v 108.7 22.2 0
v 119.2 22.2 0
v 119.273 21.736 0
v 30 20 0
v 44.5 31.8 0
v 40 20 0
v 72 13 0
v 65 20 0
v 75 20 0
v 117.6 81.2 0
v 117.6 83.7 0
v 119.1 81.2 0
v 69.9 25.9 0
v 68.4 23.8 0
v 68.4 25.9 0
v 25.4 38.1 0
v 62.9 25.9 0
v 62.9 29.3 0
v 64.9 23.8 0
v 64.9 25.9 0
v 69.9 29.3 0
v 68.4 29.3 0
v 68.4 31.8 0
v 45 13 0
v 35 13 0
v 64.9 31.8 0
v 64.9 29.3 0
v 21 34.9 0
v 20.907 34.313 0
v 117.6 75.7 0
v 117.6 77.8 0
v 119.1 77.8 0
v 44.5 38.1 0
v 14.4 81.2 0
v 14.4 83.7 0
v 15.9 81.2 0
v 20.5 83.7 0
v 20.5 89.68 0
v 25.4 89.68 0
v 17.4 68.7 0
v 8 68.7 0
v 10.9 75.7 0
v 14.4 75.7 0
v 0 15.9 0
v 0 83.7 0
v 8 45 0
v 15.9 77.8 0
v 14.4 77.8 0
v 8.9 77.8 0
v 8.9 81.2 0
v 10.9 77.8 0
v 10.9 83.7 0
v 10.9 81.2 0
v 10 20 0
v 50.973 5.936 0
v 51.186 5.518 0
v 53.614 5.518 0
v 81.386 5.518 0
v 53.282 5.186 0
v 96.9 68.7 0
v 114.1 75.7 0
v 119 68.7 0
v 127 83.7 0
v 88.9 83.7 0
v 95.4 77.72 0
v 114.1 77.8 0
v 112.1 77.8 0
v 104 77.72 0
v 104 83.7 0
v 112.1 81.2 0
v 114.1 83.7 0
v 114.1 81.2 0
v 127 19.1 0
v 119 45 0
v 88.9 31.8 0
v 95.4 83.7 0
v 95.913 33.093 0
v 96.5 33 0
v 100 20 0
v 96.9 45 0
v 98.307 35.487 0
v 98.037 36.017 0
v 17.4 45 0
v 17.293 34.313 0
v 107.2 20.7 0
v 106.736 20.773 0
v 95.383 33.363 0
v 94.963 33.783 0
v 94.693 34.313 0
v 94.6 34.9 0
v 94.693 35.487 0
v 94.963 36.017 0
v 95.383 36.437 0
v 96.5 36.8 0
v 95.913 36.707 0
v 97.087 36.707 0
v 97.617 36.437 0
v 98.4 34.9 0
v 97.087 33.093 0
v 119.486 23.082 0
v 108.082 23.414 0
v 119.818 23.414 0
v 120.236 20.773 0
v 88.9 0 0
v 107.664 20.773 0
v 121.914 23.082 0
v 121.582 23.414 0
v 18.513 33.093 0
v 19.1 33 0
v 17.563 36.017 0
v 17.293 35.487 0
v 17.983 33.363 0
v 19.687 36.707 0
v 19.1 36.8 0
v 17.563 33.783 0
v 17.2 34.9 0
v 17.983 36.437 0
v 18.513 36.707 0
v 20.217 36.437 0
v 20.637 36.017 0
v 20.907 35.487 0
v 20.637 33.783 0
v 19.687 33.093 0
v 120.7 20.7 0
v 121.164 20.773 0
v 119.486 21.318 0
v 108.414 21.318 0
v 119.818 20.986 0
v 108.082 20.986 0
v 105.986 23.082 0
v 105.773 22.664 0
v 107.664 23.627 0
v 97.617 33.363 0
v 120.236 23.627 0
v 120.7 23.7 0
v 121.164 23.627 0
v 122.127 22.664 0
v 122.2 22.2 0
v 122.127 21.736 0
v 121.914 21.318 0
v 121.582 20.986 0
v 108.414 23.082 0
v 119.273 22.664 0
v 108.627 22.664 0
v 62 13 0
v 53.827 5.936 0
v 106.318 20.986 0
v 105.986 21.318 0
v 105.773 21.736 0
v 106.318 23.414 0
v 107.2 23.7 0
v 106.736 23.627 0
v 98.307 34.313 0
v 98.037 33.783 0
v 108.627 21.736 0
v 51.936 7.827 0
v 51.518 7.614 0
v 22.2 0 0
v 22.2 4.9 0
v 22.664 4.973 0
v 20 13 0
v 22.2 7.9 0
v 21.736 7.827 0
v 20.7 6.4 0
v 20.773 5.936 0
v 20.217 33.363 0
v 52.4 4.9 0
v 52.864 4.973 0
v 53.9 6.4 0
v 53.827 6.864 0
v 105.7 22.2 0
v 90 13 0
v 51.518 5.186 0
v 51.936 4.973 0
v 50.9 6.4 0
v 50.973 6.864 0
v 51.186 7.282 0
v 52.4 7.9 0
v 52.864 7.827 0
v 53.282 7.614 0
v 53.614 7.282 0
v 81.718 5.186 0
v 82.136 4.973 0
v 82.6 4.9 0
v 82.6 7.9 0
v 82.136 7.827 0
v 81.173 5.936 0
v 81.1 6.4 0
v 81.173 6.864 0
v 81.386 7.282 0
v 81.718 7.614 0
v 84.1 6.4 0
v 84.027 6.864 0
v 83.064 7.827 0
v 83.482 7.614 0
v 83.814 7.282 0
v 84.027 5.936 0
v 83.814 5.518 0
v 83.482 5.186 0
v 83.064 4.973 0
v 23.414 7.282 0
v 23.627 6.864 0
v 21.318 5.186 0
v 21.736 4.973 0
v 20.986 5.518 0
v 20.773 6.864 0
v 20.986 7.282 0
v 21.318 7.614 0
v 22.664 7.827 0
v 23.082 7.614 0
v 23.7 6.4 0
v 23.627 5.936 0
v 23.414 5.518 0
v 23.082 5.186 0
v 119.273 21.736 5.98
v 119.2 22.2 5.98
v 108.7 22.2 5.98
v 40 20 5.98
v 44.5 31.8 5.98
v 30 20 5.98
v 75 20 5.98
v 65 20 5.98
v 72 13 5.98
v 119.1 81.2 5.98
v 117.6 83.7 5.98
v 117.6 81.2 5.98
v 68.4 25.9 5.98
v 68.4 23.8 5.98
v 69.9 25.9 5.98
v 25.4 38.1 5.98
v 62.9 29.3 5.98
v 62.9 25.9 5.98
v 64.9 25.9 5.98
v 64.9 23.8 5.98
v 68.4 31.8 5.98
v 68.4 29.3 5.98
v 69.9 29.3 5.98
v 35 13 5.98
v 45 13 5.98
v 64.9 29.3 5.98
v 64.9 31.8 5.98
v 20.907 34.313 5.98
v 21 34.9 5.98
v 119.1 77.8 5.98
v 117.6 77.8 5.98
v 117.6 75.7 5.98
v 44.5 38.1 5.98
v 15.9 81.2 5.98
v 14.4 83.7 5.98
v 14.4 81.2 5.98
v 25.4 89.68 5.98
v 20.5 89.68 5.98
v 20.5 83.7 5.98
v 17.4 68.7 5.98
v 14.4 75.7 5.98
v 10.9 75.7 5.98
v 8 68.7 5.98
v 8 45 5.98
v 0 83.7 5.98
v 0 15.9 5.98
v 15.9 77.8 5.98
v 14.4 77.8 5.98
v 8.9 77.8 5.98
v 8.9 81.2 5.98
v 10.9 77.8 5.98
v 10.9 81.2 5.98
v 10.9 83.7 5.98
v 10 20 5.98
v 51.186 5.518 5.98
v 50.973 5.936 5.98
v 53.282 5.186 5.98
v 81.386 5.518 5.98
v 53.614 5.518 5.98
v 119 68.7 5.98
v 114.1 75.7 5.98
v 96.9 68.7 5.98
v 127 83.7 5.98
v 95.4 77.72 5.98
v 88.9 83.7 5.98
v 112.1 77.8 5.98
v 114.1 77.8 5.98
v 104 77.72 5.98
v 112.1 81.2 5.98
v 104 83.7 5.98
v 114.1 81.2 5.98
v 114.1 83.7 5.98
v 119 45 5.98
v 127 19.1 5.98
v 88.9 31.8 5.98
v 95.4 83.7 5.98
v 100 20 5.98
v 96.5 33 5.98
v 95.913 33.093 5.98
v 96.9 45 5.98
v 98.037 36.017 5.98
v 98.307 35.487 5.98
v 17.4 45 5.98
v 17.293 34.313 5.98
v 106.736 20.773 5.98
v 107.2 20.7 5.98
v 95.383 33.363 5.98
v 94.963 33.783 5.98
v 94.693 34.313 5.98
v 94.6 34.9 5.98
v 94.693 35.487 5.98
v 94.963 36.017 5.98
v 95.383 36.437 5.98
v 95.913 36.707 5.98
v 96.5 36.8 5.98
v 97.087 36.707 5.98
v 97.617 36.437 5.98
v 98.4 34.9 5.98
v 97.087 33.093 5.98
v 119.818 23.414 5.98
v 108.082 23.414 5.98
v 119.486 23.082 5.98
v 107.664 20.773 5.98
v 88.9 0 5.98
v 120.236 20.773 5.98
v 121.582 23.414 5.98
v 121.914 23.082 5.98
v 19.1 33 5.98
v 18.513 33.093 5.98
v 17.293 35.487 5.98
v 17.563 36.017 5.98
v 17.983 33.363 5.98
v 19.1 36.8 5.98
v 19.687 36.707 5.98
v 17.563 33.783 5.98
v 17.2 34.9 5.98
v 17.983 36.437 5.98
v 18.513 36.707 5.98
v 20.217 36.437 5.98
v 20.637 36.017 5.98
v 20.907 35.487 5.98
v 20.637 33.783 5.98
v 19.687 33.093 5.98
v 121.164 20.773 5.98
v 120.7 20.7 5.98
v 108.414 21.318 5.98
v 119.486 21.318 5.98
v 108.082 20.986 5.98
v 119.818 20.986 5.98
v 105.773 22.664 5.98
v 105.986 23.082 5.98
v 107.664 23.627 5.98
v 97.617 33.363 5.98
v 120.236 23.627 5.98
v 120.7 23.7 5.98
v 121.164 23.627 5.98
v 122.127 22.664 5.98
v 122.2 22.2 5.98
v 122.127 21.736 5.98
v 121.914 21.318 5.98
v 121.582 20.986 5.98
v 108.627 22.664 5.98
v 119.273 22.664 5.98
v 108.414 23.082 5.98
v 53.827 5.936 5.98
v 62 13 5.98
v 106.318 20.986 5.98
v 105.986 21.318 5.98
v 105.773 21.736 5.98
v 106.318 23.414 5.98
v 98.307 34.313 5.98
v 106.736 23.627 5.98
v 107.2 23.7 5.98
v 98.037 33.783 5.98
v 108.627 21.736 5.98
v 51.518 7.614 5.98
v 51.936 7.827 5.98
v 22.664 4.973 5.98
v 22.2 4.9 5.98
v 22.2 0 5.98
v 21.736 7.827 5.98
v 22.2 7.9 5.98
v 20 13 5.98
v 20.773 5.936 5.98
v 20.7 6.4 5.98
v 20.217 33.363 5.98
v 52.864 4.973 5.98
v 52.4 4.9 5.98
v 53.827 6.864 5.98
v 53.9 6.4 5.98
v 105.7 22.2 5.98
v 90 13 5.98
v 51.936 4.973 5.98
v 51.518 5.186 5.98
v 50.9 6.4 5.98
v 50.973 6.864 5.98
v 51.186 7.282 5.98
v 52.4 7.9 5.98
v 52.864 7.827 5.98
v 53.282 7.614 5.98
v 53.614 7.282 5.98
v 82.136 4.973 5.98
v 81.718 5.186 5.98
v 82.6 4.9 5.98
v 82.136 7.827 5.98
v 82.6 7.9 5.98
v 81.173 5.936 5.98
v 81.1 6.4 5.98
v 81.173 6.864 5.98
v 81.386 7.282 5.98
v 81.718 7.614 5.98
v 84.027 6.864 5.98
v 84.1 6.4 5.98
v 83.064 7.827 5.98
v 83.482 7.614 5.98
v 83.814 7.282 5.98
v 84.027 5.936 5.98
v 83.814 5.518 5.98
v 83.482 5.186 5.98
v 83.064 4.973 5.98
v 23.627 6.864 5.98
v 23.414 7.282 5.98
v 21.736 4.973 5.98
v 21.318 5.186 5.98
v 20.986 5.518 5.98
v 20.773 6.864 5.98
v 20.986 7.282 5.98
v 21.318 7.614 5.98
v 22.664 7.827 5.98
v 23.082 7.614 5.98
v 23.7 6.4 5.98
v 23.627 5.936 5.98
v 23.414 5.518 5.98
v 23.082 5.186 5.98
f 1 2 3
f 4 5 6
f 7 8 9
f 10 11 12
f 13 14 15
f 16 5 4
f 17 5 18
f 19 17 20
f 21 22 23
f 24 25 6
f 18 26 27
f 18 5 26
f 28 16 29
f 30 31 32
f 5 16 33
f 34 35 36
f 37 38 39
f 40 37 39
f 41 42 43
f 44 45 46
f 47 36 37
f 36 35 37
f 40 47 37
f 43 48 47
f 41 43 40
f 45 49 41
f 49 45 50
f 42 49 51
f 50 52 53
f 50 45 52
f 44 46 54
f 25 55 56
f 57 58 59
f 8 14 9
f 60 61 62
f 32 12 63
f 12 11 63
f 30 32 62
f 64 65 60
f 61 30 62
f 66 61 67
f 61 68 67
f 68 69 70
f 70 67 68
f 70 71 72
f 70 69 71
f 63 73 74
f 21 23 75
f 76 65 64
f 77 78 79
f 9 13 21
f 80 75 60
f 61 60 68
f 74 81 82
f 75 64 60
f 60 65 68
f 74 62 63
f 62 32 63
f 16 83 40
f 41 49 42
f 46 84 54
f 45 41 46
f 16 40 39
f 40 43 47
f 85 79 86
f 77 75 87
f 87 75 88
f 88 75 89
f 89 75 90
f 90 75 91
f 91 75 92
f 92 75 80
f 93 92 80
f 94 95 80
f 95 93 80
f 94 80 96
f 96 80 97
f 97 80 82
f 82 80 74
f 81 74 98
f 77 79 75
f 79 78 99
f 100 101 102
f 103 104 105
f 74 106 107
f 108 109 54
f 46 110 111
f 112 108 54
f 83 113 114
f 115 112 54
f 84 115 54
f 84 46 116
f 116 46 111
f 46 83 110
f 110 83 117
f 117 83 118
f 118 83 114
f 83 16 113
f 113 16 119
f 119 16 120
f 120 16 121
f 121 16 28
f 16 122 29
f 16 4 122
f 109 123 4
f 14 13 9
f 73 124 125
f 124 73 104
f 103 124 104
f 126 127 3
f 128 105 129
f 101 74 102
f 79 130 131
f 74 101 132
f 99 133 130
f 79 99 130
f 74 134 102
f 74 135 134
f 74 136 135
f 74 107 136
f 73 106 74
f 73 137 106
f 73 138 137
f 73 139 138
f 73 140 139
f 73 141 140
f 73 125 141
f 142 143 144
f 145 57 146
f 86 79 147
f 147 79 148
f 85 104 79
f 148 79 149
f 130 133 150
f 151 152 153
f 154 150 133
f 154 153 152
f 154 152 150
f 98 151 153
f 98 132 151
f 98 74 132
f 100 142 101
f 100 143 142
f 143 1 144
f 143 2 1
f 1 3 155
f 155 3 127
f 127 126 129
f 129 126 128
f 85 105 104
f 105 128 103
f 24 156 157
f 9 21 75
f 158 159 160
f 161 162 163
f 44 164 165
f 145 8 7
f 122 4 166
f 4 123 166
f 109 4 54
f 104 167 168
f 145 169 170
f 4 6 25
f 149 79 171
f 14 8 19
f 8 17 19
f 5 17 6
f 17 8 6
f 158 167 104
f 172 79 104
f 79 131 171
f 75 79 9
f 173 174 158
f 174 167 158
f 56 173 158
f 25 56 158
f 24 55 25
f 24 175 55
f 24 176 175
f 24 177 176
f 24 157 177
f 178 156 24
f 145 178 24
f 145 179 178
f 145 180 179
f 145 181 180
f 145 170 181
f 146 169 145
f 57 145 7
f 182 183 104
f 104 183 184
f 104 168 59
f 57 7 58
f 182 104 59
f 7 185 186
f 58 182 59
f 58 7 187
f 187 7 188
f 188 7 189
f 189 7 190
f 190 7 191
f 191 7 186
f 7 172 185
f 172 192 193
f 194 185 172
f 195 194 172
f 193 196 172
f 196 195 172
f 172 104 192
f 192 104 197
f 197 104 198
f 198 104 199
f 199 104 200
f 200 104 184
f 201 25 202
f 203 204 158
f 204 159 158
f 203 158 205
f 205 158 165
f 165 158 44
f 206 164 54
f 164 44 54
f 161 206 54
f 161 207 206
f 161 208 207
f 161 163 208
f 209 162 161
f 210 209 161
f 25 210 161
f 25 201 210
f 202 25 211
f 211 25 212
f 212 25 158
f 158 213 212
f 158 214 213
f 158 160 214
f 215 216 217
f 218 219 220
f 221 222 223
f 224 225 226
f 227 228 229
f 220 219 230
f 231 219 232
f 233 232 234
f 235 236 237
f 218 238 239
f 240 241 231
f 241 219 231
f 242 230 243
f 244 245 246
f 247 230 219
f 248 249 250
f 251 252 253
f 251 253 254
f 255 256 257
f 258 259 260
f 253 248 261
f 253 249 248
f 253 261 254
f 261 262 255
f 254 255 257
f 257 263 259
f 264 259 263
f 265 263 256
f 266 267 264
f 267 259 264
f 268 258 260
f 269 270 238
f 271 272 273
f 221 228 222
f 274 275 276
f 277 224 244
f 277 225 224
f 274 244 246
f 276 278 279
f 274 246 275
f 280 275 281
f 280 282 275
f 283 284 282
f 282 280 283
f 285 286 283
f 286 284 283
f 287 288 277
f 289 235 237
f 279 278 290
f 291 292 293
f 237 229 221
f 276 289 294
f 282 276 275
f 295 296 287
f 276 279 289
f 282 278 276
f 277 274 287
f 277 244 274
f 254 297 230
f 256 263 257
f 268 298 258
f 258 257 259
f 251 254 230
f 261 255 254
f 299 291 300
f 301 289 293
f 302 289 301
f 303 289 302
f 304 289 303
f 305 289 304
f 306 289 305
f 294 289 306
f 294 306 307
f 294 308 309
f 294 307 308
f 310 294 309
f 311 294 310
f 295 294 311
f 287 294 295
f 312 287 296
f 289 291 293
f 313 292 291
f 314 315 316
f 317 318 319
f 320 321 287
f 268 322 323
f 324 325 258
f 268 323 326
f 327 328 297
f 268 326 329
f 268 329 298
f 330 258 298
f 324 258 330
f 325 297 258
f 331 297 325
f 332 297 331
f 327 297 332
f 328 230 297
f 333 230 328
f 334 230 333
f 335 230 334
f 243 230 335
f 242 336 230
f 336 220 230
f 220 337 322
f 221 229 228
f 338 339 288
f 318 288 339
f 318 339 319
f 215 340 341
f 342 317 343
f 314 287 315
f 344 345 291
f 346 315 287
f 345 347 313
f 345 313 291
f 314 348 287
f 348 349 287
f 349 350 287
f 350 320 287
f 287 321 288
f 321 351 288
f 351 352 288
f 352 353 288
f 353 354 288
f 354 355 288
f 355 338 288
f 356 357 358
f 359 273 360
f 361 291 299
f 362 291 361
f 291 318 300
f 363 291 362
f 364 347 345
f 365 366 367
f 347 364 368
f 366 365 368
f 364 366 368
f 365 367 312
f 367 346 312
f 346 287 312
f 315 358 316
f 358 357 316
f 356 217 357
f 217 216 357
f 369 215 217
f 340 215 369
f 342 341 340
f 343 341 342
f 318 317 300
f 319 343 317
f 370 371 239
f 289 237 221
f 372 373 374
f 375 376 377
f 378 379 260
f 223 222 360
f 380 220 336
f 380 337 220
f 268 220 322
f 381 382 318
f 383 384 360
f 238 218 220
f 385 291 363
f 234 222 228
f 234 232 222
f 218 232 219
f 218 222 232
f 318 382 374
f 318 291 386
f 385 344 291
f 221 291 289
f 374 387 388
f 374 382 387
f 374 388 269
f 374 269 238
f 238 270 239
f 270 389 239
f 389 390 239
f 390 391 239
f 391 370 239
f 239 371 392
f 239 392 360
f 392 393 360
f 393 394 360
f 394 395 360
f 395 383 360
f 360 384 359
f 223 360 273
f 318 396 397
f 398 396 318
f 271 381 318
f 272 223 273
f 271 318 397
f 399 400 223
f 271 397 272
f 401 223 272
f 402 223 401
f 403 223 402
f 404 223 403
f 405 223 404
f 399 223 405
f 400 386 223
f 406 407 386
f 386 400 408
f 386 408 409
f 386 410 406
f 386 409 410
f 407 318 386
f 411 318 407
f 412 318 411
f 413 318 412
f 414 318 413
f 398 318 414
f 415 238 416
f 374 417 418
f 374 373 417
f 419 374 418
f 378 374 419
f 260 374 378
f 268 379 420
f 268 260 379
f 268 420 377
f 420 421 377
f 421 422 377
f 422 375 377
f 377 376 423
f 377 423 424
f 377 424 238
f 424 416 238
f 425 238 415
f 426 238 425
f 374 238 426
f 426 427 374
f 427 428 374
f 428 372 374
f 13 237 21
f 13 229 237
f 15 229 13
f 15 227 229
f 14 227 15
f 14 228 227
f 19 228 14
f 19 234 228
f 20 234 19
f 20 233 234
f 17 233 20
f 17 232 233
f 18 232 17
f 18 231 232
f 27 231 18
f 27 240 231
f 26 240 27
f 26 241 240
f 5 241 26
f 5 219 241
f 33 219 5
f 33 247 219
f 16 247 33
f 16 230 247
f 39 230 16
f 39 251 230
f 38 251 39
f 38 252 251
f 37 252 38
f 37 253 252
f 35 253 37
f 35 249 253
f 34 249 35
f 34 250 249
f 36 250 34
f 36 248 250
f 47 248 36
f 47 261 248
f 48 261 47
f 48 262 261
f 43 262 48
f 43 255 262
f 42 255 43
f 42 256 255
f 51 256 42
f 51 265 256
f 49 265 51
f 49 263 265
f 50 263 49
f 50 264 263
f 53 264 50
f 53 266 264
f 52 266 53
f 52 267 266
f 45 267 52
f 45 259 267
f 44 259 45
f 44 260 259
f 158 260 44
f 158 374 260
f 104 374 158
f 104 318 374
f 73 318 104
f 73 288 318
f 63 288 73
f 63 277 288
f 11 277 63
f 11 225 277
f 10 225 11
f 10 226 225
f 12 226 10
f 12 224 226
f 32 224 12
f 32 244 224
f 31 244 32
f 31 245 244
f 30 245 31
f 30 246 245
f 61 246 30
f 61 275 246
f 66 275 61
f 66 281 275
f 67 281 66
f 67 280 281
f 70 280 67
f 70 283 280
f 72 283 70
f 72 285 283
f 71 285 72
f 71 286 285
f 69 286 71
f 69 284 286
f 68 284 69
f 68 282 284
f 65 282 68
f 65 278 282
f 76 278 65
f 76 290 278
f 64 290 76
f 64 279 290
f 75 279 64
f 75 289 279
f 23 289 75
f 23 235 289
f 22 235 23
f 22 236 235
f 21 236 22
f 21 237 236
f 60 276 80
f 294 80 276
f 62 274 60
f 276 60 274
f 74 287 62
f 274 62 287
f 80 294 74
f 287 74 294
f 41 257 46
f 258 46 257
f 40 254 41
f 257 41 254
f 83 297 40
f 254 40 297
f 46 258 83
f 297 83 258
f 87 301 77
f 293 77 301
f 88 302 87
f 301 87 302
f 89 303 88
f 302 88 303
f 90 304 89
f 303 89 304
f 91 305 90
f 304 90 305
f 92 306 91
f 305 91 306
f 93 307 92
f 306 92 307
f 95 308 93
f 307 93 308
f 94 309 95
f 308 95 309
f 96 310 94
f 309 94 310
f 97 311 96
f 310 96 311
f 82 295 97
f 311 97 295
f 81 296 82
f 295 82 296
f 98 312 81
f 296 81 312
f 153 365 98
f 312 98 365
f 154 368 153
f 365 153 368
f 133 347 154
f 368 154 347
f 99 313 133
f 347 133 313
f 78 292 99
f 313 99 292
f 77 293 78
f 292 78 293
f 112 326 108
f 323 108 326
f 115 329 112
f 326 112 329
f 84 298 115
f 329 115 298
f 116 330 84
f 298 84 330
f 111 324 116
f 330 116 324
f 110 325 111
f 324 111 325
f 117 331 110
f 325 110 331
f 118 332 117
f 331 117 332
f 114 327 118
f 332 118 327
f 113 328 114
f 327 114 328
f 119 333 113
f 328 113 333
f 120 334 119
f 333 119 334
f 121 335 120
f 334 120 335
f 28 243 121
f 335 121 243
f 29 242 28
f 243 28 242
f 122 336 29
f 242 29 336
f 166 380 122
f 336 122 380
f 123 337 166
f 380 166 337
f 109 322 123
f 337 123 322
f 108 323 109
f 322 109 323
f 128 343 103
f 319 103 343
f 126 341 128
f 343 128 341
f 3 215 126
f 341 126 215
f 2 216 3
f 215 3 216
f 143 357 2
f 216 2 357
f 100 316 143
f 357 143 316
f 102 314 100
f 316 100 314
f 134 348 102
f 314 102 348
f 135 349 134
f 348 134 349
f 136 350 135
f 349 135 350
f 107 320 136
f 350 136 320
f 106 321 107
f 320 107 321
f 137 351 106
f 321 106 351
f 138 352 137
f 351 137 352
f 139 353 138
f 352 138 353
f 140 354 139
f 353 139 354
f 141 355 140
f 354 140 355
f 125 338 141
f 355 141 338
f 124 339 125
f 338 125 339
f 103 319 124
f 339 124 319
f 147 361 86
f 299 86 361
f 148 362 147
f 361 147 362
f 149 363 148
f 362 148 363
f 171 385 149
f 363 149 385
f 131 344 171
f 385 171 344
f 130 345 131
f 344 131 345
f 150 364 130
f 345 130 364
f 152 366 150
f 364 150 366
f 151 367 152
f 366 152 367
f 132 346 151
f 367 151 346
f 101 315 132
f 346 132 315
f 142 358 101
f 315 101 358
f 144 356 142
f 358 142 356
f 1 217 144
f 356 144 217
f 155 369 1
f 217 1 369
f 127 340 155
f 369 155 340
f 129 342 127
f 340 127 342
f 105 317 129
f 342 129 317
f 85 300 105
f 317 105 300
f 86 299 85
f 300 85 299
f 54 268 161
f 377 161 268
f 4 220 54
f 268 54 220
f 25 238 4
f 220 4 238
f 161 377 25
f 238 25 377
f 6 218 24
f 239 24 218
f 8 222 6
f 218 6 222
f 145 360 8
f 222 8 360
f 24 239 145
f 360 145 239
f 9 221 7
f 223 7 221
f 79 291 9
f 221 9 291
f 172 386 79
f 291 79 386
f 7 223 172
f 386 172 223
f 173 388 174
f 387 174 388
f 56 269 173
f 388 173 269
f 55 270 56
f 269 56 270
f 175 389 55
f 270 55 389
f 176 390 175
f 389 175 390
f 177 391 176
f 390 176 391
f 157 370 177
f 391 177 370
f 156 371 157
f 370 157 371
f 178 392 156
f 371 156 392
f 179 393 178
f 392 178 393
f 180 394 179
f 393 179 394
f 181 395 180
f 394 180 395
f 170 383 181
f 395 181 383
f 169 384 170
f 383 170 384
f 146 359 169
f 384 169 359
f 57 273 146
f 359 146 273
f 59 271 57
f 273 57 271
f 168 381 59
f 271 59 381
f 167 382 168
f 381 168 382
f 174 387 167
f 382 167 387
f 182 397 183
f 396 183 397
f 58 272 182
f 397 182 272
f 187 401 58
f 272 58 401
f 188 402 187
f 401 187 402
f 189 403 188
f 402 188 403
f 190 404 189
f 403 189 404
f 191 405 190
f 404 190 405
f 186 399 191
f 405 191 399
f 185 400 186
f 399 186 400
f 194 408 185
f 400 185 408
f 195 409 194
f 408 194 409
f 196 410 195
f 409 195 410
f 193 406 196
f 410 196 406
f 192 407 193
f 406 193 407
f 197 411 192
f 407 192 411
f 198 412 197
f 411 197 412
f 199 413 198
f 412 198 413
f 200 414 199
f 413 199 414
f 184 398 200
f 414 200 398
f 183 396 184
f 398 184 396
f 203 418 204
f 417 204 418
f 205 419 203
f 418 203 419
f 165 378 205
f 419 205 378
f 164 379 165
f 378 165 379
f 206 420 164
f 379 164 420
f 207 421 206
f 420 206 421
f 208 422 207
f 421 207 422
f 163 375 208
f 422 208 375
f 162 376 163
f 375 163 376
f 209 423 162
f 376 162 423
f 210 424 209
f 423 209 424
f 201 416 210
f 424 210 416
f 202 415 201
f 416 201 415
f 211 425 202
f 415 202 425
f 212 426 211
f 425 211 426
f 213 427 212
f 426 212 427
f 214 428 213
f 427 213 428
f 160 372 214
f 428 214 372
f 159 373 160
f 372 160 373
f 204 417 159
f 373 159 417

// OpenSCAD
// leftSide: The left vertical piece of the robot

// Definitions (all lengths are in millimeters)
yMax=83.7; //top of the main shape
x1=25.4;   //a repeated x coordinate
x2=44.5;   //a repeated x coordinate
x3=88.9;   //a repeated x coordinate
xMax=127;  //end of shape
notchDepth=4.9; //depth of top tab
th=5.98;      //thickness of a standard robot body part

bh = 1.9; // radius of 4-40 bolt hole
wt = 1.5; // radius of a tank wheel tap screw


// this module defines a 2D shape that we'll then
// extrude to the desired thickness
module botLeftSide(){
  difference(){ //the shape is a main body minus cutouts
    union(){ //the main body is a collection of 5 parts
      //1: Rear tower (outside face is on z=0)
      polygon([[0,15.9],[0,yMax],[x1,yMax],[x1,0],[22.2,0]],
              [[0,1,2,3,4]]);
      //2: Small notch on rear tower to help tell left from right
      translate([x1-notchDepth,yMax]) square([notchDepth,th]);
      //3: Middle part connecting two towers (1 of 2)
      translate([x1,0]) square([x2-x1,38.1]);
      //4: Middle part connecting two towers (2 of 2)
      translate([x2,0]) square([x3-x2,31.8]);
      //5: Front tower
      polygon([[x3,0],[x3,yMax],[xMax,yMax],[xMax,19.1]],
              [[0,1,2,3]]);
    } //end of union()

    //Everything below are cut-outs/subtractions

    //bolt holes to connect to the bottom platform
    translate([19.1,34.9]) circle(r=bh, $fn=20);
    //for reference, this hole is 127-19.1=107.9 from the front
    translate([96.5,34.9]) circle(r=bh, $fn=20);
    //for reference, this hole is 127-96.5=30.5 from the front

    //holes for tank wheel threaded screws
    translate([22.2, 6.4]) circle(r=wt, $fn=20);
    translate([52.4, 6.4]) circle(r=wt, $fn=20);
    translate([82.6, 6.4]) circle(r=wt, $fn=20);
    translate([120.7,22.2])circle(r=wt, $fn=20);
    //the second hole is for using a different gearbox axle
    translate([120.7-13.5,22.2])circle(r=wt, $fn=20);

    //"cross" notches for nuts/bolts from above
    translate([10.9,yMax]) t_down();
    translate([114.1,yMax]) t_down();
    translate([64.9,31.8])  t_down();
    //for reference, this translates  to a a bolt that is
    //127-64.9-1.75=60.35 from the front (xMax)

    //cut-out for the speaker shelf
    translate([95.4,yMax-th]) square([8.6,th]);

    //optional cutouts to reduce material usage
    polygon([[20,13],[10,20],[30,20],[35,13]],[[0,1,2,3]]);
    polygon([[45,13],[40,20],[65,20],[62,13]],[[0,1,2,3]]);
    polygon([[72,13],[75,20],[100,20],[90,13]],[[0,1,2,3]]);
    polygon([[x3+8,45],[x3+8,yMax-15],
             [xMax-8,yMax-15],[xMax-8,45]],[[0,1,2,3]]);
    polygon([[8,45],[8,yMax-15],
             [x1-8,yMax-15],[x1-8,45]],[[0,1,2,3]]);

  } //end of difference()
} //end of botLeftSide()


linear_extrude(height=th) botLeftSide();

module t_down(){ //this function makes the "cross" shapes
  union(){
    translate([0,-8]) square([3.5,8]);
    translate([-2,-5.9]) square([7,3.4]);
  }
}
